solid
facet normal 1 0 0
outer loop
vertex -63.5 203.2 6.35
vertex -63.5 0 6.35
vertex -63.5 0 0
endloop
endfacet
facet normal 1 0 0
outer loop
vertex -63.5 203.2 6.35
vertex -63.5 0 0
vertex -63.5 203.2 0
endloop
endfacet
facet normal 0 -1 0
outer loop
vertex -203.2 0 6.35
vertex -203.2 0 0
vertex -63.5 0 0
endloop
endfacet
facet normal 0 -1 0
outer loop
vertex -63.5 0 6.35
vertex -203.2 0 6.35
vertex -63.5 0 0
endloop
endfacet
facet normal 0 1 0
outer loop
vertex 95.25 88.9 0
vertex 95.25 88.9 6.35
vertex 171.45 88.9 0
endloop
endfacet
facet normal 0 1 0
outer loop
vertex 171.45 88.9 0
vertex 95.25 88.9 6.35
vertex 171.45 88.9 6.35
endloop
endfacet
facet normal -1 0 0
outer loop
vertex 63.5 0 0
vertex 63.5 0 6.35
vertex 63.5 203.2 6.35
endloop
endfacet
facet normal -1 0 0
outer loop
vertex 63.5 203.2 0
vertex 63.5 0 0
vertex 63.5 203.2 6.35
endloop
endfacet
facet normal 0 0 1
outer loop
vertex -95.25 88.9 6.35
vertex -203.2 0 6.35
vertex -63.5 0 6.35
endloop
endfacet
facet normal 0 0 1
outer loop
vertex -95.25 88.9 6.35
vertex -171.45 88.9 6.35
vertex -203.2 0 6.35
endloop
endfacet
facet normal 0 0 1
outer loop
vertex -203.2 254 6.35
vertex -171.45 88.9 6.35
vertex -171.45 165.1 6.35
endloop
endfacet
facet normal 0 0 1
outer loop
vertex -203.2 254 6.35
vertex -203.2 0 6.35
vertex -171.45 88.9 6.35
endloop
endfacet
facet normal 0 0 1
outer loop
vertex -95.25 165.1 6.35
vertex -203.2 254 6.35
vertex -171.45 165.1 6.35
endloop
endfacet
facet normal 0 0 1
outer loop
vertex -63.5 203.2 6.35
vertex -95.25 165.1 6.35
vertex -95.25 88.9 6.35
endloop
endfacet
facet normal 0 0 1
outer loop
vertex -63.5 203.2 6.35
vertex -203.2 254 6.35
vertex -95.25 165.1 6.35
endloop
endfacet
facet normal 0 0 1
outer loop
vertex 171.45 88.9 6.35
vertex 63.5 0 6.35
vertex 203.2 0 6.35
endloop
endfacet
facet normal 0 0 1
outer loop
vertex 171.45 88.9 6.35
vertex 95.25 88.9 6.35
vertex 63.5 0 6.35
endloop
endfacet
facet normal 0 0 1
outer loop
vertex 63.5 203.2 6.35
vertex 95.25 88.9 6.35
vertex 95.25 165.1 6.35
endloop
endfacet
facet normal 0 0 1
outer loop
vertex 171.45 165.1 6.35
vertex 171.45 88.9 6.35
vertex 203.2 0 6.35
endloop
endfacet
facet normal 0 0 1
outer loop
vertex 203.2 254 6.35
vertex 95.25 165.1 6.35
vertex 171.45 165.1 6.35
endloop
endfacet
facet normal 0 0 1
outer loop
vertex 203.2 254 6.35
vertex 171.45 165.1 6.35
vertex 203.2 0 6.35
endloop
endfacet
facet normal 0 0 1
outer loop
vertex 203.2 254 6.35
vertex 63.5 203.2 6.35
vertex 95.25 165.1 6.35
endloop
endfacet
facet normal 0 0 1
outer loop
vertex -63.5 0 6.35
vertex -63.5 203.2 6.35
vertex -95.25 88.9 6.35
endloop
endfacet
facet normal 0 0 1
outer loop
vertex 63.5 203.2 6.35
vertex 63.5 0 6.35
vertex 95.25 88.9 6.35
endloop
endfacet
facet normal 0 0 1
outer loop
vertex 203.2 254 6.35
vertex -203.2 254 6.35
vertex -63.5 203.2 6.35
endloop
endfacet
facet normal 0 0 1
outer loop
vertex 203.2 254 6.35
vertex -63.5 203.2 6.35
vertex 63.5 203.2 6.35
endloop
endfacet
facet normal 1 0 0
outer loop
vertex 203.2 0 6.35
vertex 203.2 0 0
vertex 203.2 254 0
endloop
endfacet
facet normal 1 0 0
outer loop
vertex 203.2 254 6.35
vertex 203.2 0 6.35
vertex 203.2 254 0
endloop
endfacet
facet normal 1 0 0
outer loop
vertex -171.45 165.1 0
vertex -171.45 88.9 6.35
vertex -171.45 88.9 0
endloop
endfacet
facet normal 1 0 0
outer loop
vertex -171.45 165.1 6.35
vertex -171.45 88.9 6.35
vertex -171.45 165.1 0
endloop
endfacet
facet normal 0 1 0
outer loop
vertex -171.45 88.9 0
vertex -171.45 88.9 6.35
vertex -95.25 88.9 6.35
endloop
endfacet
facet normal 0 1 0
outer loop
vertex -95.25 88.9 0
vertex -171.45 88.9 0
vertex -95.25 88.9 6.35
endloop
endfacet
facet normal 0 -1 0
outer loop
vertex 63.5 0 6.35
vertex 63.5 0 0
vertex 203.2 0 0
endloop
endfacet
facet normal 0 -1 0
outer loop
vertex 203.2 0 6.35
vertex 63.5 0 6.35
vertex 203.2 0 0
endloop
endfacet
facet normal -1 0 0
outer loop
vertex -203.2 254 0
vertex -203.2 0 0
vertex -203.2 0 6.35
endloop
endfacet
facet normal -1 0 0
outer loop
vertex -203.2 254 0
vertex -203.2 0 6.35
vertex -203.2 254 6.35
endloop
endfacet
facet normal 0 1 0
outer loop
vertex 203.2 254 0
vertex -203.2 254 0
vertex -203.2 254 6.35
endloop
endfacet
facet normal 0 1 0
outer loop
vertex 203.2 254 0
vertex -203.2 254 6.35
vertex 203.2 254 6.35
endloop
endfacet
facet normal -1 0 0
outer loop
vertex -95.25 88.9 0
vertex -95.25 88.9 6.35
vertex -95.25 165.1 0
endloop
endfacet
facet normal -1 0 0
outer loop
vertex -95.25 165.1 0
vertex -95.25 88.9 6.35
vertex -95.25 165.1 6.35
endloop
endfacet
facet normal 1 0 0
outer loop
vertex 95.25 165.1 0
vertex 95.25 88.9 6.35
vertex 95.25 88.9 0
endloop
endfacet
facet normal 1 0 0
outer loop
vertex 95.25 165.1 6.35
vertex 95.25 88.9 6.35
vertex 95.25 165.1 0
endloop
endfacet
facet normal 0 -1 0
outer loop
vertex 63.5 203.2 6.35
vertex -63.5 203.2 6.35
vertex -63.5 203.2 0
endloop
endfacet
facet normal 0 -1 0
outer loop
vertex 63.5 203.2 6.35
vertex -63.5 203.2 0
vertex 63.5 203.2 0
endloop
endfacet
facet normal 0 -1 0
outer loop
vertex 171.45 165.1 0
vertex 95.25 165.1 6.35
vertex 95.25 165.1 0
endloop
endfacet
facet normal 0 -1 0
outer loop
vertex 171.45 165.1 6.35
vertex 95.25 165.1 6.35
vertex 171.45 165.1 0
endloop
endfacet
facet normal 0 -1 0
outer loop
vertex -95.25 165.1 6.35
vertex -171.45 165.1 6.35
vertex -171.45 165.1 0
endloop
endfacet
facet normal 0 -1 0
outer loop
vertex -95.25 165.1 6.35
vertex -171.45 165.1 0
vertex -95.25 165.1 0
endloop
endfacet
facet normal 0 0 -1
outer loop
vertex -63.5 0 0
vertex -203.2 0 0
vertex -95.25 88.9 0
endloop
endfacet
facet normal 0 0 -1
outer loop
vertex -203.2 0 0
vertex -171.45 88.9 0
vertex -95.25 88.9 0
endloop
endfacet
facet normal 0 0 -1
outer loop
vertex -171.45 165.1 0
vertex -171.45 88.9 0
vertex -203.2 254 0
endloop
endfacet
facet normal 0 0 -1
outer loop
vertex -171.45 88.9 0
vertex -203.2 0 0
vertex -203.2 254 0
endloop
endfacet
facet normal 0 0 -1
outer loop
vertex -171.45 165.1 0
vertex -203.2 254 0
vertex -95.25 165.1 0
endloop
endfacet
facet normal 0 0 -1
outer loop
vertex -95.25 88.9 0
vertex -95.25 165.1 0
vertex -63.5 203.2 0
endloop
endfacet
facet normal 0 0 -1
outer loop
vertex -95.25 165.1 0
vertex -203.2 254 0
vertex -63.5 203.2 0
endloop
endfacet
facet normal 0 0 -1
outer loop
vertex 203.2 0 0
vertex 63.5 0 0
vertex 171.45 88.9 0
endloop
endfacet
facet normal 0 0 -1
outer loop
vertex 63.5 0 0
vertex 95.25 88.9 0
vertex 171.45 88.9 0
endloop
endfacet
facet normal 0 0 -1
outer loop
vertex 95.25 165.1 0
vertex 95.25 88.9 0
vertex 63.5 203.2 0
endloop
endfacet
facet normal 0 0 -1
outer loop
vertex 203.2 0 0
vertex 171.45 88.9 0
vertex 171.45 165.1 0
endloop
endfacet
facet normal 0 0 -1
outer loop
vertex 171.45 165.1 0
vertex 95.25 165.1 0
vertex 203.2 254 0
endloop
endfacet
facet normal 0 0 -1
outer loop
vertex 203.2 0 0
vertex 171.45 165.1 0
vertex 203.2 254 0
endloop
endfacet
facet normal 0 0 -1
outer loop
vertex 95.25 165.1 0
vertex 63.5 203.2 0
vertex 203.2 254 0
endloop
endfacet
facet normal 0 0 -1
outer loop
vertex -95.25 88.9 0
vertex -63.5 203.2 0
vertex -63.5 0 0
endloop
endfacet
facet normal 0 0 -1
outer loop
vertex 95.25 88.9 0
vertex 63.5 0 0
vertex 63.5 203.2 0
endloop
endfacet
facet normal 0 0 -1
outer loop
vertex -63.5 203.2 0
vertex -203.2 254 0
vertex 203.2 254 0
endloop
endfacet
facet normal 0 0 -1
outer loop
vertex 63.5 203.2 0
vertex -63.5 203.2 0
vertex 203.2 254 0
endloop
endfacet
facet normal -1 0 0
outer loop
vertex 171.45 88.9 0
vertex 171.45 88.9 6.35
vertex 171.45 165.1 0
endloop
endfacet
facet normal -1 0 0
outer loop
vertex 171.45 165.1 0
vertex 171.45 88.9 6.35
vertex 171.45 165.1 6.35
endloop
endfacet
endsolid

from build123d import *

# Parameters (mm, degrees)
SKETCH1_W           = 406.4
SKETCH1_H           = 254
BOSS_EXTRUDE1_DEPTH = 6.35
CUT_EXTRUDE1_REACH  = 8.35
SKETCH2_W           = 127
SKETCH2_H           = 203.2
CUT_EXTRUDE3_REACH  = 8.35
SKETCH3_W           = 76.2
SKETCH3_H           = 76.2
CUT_EXTRUDE4_REACH  = 8.35
SKETCH4_W           = 76.2
SKETCH4_H           = 76.2


with BuildPart() as part:
    # Sketch1 → Boss-Extrude1 (new body)
    with BuildSketch(Plane.XY):
        with Locations((0, 127)):
            Rectangle(SKETCH1_W, SKETCH1_H)
    extrude(amount=BOSS_EXTRUDE1_DEPTH)

    # Sketch2 → Cut-Extrude1 (cut, up to next)
    with BuildSketch(Plane.XY.offset(6.35), mode=Mode.PRIVATE) as cut_extrude1_sk1:
        with Locations((0, 101.6)):
            Rectangle(SKETCH2_W, SKETCH2_H)
    cut_extrude1_tool1 = extrude(cut_extrude1_sk1.sketch, amount=-CUT_EXTRUDE1_REACH, mode=Mode.PRIVATE) & part.part
    add(cut_extrude1_tool1.solids().sort_by_distance((0, 101.6, 6.35))[0], mode=Mode.SUBTRACT)

    # Sketch3 → Cut-Extrude3 (cut, up to next)
    with BuildSketch(Plane.XY.offset(6.35), mode=Mode.PRIVATE) as cut_extrude3_sk1:
        with Locations((-133.35, 127)):
            Rectangle(SKETCH3_W, SKETCH3_H)
    cut_extrude3_tool1 = extrude(cut_extrude3_sk1.sketch, amount=-CUT_EXTRUDE3_REACH, mode=Mode.PRIVATE) & part.part
    add(cut_extrude3_tool1.solids().sort_by_distance((-133.35, 127, 6.35))[0], mode=Mode.SUBTRACT)

    # Sketch4 → Cut-Extrude4 (cut, up to next)
    with BuildSketch(Plane.XY.offset(6.35), mode=Mode.PRIVATE) as cut_extrude4_sk1:
        with Locations((133.35, 127)):
            Rectangle(SKETCH4_W, SKETCH4_H)
    cut_extrude4_tool1 = extrude(cut_extrude4_sk1.sketch, amount=-CUT_EXTRUDE4_REACH, mode=Mode.PRIVATE) & part.part
    add(cut_extrude4_tool1.solids().sort_by_distance((133.35, 127, 6.35))[0], mode=Mode.SUBTRACT)


solid = part.part
